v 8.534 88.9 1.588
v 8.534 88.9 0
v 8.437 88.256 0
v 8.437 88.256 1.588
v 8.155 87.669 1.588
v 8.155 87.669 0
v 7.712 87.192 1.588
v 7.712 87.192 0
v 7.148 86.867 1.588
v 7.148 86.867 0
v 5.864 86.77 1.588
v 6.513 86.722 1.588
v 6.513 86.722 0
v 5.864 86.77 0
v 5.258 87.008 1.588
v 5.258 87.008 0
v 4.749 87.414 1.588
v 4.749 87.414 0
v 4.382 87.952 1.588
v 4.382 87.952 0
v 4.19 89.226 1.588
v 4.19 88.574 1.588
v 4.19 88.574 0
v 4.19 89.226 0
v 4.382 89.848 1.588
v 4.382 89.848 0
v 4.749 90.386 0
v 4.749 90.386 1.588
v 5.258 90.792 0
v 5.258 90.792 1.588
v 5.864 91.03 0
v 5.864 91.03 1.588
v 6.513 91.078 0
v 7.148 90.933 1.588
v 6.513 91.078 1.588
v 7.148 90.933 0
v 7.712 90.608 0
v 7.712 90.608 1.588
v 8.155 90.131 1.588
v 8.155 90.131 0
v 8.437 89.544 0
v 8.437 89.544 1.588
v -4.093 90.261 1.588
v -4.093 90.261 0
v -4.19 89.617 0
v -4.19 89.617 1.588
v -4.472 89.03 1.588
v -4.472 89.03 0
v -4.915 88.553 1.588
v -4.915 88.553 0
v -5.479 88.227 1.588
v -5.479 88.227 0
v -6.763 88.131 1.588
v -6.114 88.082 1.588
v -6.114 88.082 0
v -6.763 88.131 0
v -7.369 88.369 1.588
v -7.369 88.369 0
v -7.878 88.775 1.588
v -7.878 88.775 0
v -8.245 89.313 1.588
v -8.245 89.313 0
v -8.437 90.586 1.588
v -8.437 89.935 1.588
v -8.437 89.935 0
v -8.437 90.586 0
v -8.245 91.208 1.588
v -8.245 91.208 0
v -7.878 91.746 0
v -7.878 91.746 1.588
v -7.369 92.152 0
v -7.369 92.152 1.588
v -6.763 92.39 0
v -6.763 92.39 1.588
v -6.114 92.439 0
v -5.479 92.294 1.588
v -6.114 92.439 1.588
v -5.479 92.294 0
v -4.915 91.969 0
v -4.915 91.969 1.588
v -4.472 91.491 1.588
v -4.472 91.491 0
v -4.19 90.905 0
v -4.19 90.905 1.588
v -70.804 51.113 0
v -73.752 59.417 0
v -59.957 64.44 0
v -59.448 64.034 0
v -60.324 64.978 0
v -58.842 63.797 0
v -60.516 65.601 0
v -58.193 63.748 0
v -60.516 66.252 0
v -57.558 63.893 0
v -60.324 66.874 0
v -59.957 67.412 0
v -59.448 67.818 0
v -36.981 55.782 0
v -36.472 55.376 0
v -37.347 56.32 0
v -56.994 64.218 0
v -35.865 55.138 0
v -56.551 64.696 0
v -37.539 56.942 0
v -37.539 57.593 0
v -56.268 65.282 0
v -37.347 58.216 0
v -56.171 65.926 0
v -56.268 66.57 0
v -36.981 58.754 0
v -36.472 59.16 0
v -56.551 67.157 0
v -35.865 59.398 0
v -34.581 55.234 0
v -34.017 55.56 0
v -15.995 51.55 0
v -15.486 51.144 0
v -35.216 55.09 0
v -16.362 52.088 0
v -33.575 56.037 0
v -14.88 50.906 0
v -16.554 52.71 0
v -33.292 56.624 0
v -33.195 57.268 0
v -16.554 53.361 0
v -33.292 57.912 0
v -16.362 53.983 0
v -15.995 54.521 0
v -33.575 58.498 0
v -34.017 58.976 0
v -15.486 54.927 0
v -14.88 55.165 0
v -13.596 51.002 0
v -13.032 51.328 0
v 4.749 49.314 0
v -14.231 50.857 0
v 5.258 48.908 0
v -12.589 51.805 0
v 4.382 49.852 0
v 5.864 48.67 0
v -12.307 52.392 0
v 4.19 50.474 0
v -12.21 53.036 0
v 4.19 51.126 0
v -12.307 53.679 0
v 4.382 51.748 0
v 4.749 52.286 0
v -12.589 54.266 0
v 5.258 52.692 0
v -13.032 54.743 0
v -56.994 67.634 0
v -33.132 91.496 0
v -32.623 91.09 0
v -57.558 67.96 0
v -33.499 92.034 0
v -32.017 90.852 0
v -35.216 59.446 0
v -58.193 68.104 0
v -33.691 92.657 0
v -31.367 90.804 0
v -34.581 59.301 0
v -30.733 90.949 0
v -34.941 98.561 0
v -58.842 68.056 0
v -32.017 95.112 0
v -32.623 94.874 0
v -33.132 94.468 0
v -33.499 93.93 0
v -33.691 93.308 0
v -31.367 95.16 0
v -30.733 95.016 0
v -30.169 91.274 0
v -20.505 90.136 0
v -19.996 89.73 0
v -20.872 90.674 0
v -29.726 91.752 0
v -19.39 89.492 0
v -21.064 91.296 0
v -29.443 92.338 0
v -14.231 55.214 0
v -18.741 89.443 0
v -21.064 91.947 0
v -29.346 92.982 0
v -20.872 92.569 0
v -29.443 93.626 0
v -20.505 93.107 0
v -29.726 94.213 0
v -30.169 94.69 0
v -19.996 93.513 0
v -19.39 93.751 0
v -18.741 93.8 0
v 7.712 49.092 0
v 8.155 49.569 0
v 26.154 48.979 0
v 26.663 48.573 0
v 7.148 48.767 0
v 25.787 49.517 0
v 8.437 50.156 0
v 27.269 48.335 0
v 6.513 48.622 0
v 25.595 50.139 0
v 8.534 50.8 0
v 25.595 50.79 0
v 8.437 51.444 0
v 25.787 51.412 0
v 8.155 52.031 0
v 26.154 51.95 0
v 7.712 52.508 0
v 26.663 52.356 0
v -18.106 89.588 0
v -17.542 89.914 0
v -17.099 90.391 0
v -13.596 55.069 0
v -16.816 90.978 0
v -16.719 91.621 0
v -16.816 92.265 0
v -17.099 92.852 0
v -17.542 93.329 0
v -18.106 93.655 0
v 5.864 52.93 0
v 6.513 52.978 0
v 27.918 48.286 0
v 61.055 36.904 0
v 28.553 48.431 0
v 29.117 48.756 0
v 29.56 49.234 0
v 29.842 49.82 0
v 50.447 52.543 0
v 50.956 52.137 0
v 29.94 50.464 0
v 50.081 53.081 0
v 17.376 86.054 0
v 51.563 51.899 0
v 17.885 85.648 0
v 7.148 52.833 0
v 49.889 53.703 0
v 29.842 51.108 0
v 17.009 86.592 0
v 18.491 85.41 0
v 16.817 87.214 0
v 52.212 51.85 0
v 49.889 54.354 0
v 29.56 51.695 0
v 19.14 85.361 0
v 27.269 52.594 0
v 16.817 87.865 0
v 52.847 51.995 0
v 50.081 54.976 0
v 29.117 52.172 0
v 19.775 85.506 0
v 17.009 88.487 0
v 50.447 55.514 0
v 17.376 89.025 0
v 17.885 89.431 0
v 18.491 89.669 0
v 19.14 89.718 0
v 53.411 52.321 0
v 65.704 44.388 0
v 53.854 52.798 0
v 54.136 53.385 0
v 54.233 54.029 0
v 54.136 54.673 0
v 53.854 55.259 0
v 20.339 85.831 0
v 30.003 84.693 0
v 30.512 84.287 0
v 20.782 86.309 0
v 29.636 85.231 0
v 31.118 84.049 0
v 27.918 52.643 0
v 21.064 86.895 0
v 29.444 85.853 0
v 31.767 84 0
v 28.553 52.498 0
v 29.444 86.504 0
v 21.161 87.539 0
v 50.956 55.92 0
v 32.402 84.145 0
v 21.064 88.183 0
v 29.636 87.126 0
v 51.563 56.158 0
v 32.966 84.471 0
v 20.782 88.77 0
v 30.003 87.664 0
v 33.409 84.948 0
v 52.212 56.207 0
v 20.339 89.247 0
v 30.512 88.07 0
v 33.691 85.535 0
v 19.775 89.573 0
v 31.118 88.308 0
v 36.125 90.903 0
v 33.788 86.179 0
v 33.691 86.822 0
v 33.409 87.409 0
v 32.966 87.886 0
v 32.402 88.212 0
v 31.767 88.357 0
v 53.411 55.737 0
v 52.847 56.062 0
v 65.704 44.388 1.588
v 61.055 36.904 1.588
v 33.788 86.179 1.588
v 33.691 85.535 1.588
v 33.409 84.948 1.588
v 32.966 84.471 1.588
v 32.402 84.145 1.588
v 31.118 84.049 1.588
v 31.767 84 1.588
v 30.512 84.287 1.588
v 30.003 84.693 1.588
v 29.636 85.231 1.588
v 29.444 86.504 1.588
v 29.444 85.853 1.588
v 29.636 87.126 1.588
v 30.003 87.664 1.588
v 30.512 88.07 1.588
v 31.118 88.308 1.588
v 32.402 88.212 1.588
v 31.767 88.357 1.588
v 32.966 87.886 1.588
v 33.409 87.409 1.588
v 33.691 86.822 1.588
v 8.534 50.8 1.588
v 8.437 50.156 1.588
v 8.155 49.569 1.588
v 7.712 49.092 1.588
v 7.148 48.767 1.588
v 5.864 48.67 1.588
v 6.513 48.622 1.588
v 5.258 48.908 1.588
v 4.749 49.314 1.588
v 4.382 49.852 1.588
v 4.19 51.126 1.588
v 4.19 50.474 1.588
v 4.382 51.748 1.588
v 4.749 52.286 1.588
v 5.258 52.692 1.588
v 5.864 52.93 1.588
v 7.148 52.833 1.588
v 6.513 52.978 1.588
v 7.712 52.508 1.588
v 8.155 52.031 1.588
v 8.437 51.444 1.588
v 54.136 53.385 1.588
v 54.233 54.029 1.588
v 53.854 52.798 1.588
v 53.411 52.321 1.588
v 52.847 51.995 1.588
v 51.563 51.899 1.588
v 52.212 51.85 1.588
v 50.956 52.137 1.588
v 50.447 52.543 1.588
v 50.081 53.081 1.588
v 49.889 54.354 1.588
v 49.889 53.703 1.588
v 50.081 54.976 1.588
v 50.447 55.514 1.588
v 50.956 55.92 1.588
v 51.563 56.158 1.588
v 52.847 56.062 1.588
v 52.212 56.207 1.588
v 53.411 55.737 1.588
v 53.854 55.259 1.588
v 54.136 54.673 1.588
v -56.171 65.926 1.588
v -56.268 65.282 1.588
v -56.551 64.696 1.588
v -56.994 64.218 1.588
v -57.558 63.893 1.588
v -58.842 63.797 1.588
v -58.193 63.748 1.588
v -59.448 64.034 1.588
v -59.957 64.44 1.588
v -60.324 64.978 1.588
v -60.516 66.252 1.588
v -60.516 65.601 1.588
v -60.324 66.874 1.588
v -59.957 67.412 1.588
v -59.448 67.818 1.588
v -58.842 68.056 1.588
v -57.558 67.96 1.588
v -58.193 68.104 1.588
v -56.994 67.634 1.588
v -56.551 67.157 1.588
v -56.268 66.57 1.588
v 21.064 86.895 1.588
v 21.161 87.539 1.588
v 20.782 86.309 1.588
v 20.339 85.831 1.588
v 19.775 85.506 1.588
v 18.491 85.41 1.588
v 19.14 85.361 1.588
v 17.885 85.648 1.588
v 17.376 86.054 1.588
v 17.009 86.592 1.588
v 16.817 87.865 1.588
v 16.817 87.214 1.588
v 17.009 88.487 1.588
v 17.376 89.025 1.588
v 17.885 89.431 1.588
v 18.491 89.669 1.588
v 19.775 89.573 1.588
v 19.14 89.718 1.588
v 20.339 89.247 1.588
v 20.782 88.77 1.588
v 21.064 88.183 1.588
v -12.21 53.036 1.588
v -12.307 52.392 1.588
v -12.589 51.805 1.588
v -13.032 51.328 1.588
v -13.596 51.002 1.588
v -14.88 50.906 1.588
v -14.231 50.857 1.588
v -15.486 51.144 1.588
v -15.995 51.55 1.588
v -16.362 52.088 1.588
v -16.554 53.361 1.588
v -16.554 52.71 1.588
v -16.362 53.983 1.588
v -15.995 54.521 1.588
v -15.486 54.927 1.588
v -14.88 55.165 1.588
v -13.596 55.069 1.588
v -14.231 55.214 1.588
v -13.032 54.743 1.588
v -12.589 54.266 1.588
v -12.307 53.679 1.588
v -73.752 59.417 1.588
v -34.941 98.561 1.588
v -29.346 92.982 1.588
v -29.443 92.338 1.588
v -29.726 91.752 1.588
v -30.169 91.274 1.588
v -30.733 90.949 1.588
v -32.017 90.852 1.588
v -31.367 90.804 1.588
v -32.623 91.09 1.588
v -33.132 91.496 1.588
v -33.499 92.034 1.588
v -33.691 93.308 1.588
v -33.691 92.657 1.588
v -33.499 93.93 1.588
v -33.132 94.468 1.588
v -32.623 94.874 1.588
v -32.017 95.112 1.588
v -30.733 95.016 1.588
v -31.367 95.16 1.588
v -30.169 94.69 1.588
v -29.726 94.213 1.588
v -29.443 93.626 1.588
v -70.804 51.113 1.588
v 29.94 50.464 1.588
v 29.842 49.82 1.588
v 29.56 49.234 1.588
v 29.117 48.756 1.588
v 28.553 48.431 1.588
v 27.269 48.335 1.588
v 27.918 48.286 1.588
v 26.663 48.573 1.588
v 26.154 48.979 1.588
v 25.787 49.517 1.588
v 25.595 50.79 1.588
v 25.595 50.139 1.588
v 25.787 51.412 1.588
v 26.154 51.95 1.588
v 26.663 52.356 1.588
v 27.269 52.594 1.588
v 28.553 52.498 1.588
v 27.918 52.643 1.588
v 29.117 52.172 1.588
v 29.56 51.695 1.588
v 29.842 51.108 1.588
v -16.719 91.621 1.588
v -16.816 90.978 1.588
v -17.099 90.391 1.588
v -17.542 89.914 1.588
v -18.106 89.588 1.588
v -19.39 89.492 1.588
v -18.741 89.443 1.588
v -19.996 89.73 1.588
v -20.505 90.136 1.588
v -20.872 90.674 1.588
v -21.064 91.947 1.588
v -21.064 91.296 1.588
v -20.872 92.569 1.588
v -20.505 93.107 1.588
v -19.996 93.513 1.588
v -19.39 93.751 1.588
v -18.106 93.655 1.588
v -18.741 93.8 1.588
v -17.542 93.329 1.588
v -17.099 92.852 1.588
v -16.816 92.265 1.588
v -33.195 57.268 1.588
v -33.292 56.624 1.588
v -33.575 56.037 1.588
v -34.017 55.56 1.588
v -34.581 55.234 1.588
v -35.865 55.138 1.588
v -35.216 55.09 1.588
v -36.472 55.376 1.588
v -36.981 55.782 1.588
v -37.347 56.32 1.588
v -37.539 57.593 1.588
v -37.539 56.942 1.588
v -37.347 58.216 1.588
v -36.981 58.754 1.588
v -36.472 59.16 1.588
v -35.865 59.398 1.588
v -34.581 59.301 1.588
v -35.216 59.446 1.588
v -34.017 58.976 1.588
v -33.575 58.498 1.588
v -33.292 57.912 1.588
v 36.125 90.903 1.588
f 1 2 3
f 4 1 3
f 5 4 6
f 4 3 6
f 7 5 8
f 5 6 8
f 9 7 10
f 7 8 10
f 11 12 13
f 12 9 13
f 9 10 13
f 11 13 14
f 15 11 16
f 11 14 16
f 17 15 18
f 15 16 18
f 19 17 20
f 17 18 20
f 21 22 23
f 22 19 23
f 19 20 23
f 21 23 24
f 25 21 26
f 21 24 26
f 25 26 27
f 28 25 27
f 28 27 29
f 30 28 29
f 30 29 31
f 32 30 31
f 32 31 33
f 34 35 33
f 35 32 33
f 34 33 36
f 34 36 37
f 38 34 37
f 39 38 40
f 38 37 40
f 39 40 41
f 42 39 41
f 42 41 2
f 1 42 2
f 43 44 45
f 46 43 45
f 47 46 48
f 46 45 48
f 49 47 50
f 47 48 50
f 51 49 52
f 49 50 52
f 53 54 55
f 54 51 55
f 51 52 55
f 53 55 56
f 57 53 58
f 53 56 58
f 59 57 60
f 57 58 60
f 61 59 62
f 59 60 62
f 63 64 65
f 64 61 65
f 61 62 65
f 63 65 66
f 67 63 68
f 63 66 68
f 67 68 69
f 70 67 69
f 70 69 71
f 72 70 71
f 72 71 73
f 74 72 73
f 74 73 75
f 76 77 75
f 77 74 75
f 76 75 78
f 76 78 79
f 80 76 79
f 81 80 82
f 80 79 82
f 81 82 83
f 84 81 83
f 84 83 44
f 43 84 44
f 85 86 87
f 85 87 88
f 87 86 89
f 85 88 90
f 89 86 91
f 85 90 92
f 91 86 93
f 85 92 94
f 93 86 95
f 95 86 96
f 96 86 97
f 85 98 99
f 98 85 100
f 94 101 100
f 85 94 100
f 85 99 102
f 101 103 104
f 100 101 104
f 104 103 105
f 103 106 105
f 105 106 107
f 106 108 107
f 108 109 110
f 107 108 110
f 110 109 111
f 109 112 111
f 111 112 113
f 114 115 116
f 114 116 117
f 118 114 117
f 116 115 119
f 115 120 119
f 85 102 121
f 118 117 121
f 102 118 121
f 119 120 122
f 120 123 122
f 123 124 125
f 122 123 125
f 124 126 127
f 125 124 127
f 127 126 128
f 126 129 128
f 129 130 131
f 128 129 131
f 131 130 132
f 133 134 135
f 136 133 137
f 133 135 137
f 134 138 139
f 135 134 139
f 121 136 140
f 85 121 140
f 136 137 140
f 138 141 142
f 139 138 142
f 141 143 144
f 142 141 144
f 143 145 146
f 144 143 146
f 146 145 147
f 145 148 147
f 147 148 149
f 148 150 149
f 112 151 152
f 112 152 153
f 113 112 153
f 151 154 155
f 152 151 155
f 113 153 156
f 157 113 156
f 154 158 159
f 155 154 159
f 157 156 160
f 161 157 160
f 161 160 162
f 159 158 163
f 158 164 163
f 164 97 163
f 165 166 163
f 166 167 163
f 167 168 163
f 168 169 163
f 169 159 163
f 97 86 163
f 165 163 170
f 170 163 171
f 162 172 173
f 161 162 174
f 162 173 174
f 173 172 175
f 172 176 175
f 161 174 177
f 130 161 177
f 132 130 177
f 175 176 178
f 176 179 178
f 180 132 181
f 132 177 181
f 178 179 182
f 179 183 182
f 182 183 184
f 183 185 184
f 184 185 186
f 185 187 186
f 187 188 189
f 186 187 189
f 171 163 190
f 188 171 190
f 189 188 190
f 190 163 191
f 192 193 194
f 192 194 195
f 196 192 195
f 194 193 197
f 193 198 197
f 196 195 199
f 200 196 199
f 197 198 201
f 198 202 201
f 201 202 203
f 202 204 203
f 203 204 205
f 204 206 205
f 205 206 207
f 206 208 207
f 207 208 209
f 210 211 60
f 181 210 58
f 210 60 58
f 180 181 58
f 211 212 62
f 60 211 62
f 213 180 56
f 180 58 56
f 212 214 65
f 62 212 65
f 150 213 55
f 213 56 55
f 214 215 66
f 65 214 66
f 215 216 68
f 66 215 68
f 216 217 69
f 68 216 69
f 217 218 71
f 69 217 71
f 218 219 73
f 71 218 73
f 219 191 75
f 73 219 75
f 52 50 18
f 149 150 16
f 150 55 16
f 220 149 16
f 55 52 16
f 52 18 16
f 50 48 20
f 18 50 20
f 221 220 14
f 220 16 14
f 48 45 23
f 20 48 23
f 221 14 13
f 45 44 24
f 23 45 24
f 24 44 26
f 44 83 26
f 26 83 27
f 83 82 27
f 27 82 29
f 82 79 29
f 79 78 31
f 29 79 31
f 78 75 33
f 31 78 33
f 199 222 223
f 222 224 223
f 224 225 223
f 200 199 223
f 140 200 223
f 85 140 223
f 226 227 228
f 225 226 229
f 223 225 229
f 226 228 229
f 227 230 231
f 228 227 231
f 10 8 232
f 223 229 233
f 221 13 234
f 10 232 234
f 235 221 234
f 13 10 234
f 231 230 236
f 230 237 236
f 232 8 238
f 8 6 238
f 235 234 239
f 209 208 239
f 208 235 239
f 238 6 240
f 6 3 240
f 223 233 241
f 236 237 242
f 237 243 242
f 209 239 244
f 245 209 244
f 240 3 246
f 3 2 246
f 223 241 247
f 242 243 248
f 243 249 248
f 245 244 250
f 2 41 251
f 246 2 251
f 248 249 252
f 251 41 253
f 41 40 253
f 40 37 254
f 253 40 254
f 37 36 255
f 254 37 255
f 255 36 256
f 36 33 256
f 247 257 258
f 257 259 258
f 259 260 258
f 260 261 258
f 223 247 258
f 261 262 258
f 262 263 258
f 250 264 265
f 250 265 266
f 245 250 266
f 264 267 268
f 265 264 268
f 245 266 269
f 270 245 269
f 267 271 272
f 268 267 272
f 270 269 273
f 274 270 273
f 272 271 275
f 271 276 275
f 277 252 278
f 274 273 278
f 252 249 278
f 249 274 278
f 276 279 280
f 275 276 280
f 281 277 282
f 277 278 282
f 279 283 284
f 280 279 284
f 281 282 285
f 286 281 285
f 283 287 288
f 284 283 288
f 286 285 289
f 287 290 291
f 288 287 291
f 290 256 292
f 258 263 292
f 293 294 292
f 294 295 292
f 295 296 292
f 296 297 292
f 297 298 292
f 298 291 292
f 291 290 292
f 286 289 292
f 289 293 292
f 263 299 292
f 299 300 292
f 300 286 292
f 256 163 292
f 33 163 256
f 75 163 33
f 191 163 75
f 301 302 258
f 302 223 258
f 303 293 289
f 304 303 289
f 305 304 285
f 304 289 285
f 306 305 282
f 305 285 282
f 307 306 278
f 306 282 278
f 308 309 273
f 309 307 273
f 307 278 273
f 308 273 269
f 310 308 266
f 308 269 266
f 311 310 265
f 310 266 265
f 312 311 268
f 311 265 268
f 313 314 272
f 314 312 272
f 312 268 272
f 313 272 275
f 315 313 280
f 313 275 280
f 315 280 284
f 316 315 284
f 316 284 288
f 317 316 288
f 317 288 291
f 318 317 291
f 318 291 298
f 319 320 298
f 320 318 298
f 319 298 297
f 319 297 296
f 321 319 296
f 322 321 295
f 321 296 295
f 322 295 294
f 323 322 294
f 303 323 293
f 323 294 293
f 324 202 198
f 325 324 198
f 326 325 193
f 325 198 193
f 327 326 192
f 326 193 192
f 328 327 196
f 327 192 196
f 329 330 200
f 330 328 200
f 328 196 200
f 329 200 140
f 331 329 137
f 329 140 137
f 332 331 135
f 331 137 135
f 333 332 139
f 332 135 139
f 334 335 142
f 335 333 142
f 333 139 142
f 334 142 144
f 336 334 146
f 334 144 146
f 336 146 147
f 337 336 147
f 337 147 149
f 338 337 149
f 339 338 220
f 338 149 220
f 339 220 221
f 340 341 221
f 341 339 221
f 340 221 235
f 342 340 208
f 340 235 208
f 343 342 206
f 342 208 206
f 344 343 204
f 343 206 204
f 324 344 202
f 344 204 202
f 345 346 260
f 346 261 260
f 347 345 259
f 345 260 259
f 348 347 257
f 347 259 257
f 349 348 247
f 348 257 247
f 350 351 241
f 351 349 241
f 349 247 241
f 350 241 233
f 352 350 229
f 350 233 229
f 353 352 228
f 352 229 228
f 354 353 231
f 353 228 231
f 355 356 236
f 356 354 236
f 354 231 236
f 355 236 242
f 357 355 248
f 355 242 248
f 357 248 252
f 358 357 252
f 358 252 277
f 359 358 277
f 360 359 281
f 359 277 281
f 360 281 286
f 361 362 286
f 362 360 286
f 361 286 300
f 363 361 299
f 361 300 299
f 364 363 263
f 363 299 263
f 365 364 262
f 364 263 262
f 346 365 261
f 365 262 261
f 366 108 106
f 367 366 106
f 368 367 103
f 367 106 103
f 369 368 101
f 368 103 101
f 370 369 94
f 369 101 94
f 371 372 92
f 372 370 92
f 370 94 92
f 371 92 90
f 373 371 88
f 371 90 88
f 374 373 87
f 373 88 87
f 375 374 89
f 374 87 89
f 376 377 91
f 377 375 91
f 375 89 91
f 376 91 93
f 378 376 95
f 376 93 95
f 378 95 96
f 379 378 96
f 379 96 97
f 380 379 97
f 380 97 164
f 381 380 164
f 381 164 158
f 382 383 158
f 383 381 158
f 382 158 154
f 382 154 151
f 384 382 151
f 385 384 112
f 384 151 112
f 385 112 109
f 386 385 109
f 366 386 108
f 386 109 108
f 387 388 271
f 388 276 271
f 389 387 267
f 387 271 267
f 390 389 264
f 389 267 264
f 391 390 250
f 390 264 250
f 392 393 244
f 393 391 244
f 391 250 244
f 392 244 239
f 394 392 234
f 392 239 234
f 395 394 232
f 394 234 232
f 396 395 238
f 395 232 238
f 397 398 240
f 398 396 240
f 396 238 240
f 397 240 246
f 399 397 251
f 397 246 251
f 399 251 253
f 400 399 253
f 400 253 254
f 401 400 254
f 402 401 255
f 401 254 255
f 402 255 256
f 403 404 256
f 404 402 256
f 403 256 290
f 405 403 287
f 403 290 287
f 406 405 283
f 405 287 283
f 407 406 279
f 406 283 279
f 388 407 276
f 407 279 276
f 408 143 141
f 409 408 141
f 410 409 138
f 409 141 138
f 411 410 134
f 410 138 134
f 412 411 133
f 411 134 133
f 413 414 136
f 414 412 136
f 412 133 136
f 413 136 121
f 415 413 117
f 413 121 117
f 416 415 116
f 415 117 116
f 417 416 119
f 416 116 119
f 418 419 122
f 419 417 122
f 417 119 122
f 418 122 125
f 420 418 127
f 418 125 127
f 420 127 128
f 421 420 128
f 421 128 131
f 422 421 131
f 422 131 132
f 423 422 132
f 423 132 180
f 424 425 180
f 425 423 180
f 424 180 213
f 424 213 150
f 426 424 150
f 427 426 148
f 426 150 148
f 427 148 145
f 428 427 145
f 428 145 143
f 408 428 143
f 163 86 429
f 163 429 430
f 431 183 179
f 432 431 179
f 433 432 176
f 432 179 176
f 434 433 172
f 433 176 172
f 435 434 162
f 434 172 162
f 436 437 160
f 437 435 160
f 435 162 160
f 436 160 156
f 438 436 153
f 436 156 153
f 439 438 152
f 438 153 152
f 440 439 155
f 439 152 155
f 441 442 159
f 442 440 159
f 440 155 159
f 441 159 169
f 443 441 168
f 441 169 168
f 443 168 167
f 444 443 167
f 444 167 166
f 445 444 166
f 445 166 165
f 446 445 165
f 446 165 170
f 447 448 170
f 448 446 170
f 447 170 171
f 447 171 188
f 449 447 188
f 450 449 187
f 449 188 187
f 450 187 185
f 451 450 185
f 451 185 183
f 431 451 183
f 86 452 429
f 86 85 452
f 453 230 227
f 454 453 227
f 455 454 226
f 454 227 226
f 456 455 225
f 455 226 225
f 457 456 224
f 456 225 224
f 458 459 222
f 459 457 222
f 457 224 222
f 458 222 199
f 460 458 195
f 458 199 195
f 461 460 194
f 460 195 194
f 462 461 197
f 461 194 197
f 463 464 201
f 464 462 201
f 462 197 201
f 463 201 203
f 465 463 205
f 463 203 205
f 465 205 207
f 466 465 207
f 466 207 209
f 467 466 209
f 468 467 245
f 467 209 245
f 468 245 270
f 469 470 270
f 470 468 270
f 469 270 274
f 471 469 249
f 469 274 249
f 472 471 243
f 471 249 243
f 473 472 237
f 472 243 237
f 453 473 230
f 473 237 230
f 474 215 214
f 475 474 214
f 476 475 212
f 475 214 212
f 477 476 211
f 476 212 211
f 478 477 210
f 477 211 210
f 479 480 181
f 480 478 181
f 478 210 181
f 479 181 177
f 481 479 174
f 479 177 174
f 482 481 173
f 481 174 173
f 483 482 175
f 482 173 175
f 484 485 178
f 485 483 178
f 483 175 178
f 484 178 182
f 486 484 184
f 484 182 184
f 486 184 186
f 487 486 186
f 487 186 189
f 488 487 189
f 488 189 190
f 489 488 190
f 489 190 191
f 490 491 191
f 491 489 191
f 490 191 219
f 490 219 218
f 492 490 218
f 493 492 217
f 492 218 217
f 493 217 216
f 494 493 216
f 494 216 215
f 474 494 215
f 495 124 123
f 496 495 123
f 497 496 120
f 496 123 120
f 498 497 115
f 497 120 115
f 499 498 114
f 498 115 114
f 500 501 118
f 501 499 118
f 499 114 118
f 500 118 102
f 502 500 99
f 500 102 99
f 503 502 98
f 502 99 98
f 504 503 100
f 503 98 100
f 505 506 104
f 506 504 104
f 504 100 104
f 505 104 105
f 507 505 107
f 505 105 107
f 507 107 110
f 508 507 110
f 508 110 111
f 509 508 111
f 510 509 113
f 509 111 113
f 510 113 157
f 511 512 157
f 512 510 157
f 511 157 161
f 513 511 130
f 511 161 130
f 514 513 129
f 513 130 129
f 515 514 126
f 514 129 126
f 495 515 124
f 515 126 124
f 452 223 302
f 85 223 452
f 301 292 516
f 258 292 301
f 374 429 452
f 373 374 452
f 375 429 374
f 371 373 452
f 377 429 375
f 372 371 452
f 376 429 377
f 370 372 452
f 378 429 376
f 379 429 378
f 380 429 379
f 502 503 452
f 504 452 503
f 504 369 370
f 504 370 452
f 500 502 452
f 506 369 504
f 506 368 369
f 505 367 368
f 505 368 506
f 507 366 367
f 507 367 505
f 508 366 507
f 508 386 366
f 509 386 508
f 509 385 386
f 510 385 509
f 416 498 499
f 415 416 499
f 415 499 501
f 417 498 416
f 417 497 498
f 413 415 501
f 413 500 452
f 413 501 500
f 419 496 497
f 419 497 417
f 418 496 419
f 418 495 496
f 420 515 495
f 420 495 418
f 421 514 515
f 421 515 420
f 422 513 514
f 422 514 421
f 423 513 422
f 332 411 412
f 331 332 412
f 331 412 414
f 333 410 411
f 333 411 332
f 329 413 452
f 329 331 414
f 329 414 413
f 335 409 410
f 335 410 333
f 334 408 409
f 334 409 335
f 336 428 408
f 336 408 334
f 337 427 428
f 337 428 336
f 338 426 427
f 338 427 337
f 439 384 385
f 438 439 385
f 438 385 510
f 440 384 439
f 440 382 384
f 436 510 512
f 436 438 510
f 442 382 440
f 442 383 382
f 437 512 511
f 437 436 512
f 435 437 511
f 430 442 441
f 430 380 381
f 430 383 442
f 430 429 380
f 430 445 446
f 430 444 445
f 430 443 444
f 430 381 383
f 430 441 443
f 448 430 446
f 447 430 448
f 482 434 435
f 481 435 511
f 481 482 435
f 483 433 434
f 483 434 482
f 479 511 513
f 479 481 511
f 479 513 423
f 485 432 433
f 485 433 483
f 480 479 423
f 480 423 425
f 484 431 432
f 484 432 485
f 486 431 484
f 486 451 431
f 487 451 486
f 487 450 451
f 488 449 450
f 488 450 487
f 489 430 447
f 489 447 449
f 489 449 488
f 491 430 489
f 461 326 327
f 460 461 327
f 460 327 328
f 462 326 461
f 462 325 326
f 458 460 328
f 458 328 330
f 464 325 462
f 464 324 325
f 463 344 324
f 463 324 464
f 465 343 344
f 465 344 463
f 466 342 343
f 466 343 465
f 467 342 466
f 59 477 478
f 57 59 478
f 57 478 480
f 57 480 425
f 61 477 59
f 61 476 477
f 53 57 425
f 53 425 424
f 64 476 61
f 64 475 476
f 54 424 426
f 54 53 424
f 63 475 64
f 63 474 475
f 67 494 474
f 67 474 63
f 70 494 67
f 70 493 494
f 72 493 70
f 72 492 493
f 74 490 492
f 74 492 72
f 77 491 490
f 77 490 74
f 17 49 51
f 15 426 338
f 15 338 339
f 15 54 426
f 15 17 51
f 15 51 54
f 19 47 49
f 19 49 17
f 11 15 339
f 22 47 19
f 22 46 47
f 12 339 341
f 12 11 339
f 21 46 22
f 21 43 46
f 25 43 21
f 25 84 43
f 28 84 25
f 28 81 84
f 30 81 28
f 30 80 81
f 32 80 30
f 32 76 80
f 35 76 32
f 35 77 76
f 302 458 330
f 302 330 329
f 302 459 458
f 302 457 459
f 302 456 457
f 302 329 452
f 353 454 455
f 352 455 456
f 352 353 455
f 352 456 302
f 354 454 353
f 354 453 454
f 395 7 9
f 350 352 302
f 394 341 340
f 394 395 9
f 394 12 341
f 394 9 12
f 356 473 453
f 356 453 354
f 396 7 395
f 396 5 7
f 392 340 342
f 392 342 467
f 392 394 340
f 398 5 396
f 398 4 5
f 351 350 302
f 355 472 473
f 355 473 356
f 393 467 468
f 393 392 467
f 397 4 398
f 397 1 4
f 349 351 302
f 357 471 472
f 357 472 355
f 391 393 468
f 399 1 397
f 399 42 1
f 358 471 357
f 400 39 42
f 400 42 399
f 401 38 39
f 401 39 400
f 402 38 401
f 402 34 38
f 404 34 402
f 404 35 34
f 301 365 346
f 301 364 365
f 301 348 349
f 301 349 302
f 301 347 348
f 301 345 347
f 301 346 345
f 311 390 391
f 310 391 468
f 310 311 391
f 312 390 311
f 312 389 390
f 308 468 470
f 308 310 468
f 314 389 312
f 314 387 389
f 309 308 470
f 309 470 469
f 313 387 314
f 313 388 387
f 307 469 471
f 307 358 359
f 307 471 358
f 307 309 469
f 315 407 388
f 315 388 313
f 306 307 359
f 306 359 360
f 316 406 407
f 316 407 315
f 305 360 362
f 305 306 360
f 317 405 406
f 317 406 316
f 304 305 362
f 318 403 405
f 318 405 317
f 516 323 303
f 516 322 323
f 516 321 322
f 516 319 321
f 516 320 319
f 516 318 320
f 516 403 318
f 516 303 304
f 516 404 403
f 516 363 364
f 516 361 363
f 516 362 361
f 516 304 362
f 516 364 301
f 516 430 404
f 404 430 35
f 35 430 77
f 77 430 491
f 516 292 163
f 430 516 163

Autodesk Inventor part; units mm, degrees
ref_plane "YZ Plane" through (0, 0, 0) normal (1, 0, 0) x (0, 1, 0)
ref_plane "XZ Plane" through (0, 0, 0) normal (0, 1, 0) x (-1, 0, 0)
ref_plane "XY Plane" through (0, 0, 0) normal (0, 0, 1) x (1, 0, 0)
sketch "Sketch1" plane through (0, 0, 0) normal (0, 0, 1) x (1, 0, 0)
  circle A0 centre (31.6038, 86.1786) radius 2.1844 projected
  circle A1 centre (18.9769, 87.5393) radius 2.1844 projected
  circle A2 centre (6.35, 88.9) radius 2.1844 projected
  circle A3 centre (-6.2769, 90.2607) radius 2.1844 projected
  circle A4 centre (-18.9038, 91.6214) radius 2.1844 projected
  circle A5 centre (-31.5307, 92.9821) radius 2.1844 projected
  line L0 (36.1246, 90.903) -> (-34.9412, 98.5613)
  line L1 (-73.7518, 59.4167) -> (-34.9412, 98.5613)
  line L2 (36.1246, 90.903) -> (65.7044, 44.3885)
  line L3 (61.0548, 36.9038) -> (-70.8037, 51.1132)
  circle A6 centre (52.0487, 54.0287) radius 2.1844 projected
  circle A7 centre (27.7551, 50.4643) radius 2.1844 projected
  circle A8 centre (6.35, 50.8) radius 2.1844 projected
  circle A9 centre (-14.3942, 53.0355) radius 2.1844 projected
  circle A10 centre (-35.3794, 57.2679) radius 2.1844 projected
  circle A11 centre (-58.3558, 65.9262) radius 2.1844 projected
  line L4 (61.0548, 36.9038) -> (65.7044, 44.3885)
  line L5 (-70.8037, 51.1132) -> (-73.7518, 59.4167)
  point P0 (0, 0)
  point P1 (-80.9052, 52.2018)
  point P2 (71.1563, 35.8152)
  dimension "d2" = 10.16
  dimension "d3" = 10.16
  dimension "d4" = 10.16
  dimension "d5" = 10.16
extrude "Extrusion1" add sketch "Sketch1" along normal blind 1.5875
equation "\"d3\" = d2"
equation "\"d4\" = d2"
equation "\"d5\" = d4"
properties part number "Endgame main polycarb"
